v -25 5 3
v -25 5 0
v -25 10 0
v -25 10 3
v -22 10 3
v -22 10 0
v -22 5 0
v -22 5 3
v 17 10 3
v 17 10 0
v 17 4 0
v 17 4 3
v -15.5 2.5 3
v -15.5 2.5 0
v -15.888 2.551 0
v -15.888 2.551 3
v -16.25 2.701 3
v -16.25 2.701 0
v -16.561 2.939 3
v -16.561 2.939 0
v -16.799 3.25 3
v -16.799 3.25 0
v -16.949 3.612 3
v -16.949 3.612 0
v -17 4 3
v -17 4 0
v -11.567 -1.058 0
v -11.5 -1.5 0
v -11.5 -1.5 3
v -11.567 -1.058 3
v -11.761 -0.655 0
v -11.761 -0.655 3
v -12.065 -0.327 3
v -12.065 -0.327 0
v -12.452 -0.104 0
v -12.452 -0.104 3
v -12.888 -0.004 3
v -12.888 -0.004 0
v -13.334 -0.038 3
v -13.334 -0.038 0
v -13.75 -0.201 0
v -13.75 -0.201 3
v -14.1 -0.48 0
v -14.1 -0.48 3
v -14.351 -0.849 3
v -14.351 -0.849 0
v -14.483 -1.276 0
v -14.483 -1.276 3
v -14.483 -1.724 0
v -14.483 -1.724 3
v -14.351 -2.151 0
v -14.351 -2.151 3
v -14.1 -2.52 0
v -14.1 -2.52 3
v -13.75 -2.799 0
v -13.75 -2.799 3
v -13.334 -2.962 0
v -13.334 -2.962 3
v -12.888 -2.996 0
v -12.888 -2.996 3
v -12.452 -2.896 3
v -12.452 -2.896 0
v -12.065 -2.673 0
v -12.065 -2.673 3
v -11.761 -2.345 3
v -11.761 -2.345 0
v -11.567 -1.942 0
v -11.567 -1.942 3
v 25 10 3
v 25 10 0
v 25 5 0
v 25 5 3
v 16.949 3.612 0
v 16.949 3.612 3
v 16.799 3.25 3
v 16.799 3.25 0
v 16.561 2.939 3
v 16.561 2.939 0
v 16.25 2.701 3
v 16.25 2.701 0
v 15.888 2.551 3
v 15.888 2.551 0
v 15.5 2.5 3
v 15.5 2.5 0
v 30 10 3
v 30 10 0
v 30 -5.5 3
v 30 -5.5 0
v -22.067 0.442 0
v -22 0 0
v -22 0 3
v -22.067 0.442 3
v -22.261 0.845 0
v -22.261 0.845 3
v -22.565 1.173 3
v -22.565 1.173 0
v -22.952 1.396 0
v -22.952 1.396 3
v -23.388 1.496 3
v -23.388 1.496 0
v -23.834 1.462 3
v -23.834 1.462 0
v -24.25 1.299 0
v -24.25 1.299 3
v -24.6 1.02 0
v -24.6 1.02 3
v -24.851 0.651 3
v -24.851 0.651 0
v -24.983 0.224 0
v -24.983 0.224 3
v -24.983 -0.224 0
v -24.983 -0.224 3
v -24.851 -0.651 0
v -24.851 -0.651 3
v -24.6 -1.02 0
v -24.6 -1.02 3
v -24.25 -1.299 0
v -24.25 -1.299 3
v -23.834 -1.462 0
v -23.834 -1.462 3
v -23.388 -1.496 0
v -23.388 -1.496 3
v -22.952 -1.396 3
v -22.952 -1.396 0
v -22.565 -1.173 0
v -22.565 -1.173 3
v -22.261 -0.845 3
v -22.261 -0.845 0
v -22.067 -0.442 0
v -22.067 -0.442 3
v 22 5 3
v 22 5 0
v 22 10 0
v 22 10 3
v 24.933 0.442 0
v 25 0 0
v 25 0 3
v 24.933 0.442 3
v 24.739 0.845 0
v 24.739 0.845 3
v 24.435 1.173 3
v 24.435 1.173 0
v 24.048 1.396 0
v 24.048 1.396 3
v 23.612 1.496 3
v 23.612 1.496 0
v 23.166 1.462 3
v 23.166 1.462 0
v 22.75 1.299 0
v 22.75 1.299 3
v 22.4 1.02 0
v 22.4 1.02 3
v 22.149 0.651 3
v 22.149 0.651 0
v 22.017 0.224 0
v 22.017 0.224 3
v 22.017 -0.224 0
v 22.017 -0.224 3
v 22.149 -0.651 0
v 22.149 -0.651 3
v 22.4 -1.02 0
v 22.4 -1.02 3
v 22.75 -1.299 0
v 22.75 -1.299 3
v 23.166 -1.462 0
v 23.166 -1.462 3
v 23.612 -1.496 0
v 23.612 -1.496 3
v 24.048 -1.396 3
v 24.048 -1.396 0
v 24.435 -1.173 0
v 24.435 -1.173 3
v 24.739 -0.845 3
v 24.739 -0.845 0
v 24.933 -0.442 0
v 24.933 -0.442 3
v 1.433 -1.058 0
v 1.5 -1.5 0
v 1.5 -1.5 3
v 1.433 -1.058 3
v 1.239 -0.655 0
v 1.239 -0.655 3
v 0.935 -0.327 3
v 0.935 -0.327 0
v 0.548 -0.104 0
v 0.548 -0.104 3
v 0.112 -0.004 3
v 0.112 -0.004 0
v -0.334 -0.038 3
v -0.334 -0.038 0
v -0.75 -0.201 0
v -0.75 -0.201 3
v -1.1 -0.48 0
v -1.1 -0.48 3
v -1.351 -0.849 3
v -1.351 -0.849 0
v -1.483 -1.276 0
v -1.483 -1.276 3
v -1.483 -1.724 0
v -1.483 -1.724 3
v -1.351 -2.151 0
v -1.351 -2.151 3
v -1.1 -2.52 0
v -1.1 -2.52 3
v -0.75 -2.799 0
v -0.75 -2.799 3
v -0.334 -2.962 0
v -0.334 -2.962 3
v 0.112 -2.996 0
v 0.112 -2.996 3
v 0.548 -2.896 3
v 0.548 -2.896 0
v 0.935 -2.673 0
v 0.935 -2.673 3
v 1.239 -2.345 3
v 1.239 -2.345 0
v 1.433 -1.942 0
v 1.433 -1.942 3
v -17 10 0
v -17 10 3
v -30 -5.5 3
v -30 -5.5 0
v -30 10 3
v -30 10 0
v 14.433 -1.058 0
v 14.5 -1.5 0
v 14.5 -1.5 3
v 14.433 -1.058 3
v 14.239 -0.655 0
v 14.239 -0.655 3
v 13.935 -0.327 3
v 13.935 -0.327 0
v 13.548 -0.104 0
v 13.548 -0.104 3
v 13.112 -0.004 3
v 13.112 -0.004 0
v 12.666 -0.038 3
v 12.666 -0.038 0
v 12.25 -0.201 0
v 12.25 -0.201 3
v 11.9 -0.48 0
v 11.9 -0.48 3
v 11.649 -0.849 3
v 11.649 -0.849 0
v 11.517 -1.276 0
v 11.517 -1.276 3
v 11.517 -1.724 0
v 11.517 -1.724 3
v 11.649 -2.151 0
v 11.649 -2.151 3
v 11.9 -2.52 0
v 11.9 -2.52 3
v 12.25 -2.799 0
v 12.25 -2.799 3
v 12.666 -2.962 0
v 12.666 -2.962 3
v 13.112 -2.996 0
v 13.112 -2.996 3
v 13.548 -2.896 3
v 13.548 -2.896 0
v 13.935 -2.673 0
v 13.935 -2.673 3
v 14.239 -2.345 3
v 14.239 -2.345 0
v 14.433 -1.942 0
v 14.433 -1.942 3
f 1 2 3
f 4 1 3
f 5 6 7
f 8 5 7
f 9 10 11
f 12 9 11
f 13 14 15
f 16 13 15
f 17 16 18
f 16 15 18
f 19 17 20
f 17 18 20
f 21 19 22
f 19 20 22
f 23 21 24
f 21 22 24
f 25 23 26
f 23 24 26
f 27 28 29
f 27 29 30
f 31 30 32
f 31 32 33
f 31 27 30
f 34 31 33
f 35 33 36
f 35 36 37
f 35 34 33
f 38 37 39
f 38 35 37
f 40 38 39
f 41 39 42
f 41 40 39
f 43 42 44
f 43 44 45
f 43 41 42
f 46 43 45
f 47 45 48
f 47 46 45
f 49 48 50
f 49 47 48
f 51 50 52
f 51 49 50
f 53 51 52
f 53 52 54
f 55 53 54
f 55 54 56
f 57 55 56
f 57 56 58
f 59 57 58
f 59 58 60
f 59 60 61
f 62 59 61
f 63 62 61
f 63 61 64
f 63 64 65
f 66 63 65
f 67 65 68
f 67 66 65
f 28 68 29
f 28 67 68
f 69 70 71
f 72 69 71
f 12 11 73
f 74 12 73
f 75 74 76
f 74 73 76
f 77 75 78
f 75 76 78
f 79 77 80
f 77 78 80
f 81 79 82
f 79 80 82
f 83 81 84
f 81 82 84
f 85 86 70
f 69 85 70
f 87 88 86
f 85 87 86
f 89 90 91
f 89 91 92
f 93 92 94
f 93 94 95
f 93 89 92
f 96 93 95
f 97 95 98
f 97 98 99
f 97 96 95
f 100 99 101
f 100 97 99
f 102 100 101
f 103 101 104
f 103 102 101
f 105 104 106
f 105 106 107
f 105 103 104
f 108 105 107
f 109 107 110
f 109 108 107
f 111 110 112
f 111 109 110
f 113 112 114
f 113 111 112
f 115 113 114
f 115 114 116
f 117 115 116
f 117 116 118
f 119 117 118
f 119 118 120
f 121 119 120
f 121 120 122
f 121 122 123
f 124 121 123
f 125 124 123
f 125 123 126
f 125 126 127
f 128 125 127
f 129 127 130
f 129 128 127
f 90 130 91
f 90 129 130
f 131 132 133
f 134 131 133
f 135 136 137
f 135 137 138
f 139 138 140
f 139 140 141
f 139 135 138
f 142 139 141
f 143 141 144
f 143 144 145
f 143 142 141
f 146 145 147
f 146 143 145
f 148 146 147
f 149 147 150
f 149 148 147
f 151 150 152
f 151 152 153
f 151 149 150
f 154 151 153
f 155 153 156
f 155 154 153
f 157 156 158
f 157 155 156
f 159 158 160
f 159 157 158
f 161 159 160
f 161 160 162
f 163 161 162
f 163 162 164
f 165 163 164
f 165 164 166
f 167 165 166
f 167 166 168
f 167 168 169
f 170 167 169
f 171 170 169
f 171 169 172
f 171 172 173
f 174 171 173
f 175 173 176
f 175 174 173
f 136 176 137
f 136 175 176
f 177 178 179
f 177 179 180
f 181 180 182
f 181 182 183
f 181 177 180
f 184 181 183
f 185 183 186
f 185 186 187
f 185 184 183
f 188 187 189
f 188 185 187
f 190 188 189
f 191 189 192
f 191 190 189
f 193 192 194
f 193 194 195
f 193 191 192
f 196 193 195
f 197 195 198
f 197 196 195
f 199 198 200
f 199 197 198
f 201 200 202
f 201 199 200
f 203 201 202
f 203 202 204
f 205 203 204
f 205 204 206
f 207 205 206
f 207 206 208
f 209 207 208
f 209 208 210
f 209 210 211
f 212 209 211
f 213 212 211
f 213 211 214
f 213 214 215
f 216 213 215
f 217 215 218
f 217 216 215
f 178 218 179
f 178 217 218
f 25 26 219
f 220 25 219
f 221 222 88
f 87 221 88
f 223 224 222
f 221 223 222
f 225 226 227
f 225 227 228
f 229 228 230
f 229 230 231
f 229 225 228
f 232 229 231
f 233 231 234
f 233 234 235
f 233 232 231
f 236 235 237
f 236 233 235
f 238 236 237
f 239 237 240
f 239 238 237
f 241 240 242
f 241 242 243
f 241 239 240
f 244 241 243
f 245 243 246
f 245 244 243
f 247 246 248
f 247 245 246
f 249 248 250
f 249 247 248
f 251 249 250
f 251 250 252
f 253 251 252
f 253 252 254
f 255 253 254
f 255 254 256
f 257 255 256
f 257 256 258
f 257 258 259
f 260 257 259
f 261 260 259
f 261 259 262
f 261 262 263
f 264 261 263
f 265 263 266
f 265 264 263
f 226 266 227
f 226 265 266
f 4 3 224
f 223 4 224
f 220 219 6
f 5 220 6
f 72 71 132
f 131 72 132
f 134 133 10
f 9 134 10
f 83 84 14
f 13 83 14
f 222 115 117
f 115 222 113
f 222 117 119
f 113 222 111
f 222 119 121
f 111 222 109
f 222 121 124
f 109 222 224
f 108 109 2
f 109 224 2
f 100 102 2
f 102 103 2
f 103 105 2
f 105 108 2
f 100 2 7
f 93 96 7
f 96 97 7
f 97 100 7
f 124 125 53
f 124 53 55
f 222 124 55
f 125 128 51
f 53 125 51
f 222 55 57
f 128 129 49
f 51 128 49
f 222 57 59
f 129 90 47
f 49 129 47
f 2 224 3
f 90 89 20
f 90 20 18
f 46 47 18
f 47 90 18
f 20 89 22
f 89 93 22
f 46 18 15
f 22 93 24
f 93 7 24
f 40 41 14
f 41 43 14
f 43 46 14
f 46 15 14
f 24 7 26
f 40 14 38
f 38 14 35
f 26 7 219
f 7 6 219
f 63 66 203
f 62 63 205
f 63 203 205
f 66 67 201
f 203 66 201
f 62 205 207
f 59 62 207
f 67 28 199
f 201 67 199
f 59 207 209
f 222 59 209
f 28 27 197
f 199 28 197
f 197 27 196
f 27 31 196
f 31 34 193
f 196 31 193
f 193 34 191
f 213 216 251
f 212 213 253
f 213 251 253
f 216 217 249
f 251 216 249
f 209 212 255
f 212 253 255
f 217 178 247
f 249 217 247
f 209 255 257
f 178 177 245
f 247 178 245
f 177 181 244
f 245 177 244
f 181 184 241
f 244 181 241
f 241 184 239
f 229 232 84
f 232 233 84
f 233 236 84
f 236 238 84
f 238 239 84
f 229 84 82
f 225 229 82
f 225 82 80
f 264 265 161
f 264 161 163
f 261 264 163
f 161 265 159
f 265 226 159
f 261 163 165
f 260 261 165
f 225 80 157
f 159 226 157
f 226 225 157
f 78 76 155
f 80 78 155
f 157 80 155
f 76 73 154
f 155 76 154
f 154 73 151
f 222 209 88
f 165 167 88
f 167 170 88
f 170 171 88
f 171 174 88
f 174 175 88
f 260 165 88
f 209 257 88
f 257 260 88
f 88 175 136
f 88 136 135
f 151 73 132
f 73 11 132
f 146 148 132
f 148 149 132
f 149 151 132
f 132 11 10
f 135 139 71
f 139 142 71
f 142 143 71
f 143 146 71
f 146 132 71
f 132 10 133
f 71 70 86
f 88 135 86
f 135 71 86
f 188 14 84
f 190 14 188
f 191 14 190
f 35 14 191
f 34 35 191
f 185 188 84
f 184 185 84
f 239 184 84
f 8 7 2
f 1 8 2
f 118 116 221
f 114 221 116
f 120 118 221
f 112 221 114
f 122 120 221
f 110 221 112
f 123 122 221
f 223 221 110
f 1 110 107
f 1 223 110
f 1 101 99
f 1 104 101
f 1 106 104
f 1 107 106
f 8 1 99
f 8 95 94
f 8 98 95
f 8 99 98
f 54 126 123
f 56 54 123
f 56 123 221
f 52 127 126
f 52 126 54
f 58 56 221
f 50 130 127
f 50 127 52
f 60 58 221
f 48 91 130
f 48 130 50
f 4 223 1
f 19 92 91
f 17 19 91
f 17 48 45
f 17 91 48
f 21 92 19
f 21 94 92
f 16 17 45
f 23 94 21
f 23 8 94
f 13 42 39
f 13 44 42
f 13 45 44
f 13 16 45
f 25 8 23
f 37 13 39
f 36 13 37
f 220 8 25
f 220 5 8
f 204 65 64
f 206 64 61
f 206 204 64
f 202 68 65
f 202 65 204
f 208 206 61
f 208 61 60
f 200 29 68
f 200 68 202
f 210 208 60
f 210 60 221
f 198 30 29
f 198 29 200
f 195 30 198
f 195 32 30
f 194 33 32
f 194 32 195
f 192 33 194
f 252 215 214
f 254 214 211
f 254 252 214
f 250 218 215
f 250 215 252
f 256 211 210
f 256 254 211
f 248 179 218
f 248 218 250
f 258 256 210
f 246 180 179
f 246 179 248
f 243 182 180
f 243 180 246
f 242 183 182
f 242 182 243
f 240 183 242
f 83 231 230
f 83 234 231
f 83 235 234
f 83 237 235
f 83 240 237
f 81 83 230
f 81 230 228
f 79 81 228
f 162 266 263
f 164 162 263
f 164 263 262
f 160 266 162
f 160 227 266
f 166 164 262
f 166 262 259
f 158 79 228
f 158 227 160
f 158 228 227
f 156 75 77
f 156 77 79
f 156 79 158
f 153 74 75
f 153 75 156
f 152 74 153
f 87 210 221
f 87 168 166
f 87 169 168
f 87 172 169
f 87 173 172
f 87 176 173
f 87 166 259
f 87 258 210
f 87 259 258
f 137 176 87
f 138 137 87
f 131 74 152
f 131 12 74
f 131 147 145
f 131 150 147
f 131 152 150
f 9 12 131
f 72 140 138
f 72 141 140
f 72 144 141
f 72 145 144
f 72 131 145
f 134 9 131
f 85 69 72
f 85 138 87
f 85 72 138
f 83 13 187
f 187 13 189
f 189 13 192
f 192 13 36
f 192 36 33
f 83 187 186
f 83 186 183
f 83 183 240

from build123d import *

# Parameters (mm, degrees)
F0_R     = 1.5
F1_DEPTH = 3


with BuildPart() as f1:
    # F0 (on Top) → F1 (new body)
    with BuildSketch(Plane.XY):
        with BuildLine():
            Line((-25, 10), (-30, 10))
            Line((-30, 10), (-30, -5.5))
            Line((-30, -5.5), (30, -5.5))
            Line((30, -5.5), (30, 10))
            Line((30, 10), (25, 10))
            Line((25, 10), (25, 5))
            Line((25, 5), (22, 5))
            Line((22, 5), (22, 10))
            Line((22, 10), (17, 10))
            Line((17, 10), (17, 4))
            ThreePointArc((17, 4), (16.56066, 2.93934), (15.5, 2.5))
            Line((15.5, 2.5), (-15.5, 2.5))
            ThreePointArc((-15.5, 2.5), (-16.56066, 2.93934), (-17, 4))
            Line((-17, 4), (-17, 10))
            Line((-17, 10), (-22, 10))
            Line((-22, 10), (-22, 5))
            Line((-22, 5), (-25, 5))
            Line((-25, 5), (-25, 10))
        make_face()
        with Locations((-23.5, 0)):
            Circle(F0_R, mode=Mode.SUBTRACT)
        with Locations((-13, -1.5)):
            Circle(F0_R, mode=Mode.SUBTRACT)
        with Locations((0, -1.5)):
            Circle(F0_R, mode=Mode.SUBTRACT)
        with Locations((13, -1.5)):
            Circle(F0_R, mode=Mode.SUBTRACT)
        with Locations((23.5, 0)):
            Circle(F0_R, mode=Mode.SUBTRACT)
    extrude(amount=F1_DEPTH)


solid = f1.part
